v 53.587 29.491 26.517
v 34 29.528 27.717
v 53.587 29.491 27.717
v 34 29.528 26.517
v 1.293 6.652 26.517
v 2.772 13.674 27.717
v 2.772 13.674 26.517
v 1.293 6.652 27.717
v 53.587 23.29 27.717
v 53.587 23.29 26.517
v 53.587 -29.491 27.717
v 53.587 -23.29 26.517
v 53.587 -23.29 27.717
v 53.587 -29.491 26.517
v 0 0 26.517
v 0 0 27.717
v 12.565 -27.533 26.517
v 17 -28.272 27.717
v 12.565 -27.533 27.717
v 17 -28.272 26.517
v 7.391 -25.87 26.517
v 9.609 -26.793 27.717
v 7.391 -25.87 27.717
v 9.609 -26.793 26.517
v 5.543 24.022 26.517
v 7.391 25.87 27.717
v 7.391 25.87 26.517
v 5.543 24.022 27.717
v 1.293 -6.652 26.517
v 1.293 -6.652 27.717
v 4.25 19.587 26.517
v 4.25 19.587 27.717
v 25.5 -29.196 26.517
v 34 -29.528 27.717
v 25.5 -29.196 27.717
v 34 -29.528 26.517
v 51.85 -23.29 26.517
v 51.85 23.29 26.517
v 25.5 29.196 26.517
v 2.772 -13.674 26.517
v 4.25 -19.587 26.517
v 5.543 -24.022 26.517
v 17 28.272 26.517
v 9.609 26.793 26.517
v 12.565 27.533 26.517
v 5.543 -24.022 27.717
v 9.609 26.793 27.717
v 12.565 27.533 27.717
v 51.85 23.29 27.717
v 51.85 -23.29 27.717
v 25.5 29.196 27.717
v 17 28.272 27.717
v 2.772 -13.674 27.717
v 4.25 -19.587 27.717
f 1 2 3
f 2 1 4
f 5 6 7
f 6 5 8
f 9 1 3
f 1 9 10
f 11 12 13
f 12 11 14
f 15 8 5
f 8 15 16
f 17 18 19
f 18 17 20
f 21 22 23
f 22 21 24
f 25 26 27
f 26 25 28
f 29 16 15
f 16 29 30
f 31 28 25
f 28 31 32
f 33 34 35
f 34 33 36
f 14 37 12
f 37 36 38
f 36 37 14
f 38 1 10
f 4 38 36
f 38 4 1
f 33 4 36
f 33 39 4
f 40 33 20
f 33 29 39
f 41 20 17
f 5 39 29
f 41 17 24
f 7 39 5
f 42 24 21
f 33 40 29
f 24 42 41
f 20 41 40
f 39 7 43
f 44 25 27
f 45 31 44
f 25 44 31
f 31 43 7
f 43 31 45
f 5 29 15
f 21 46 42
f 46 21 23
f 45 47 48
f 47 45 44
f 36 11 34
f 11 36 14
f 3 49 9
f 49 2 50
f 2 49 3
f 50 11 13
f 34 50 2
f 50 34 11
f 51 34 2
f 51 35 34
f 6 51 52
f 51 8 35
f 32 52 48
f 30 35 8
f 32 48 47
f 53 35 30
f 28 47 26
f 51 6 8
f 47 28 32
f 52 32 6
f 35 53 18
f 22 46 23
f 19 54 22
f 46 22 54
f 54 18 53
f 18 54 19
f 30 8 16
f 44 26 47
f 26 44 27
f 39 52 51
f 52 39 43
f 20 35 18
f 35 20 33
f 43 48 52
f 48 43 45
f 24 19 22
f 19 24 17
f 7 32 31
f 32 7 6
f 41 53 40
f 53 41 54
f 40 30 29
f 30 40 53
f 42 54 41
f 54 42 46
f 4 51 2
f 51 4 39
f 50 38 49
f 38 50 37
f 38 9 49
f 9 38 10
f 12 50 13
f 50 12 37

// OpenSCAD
// Sarepta hull study, 170 mm overall. Units in the station table are full-size mm.
// See README.md for source provenance and reconstruction limitations.
length_mm = 170;
wall_mm = 1.2;
transom_mm = 2.0;
deck_mm = 1.2;
part = "hull"; // [hull, outer, inner, sections]
station_steps = 12;

scale_factor = length_mm / 4600;
// x runs from bow to stern; y is transverse; z is above the keel baseline.
// Rows: x, then [y,z] for keel, three bottom samples, tunnel crown,
// outer chine, sheer, and deck centre. Stations 1..5 follow the 1974 body plan.
// Longitudinal positions, stem closure and sheer fairing are reconstructed.
// A separate continuous planar foredeck covers the three underlying bows.
stations = [
 [0, [[0,750],[96,750],[192,750],[288,750],[384,750],[625,750],[702,750],[0,750]]],
 [460, [[0,220],[96,325],[192,433],[288,560],[384,687],[625,506],[702,735],[0,790]]],
 [920, [[0,33],[108,92],[216,169],[324,271],[432,383],[640,270],[790,750],[0,802]]],
 [1380,[[0,0],[110,35],[219,76],[329,135],[438,211],[640,136],[800,750],[0,794]]],
 [1840,[[0,0],[110,28],[219,61],[329,99],[438,142],[640,105],[800,750],[0,780]]],
 [2300,[[0,0],[110,27],[219,53],[329,80],[438,105],[650,100],[800,750],[0,770]]],
 [3067,[[0,0],[110,16.4],[219,32.7],[329,49.2],[438,65.5],[650,97.2],[800,750],[0,765]]],
 [4200,[[0,0],[110,16.4],[219,32.7],[329,49.2],[438,65.5],[650,97.2],[800,750],[0,765]]],
 [4600,[[0,0],[110,16.4],[219,32.7],[329,49.2],[438,65.5],[650,97.2],[790,750],[0,765]]]
];

function d(i,j,k) = (stations[i+1][1][j][k]-stations[i][1][j][k]) /
                         (stations[i+1][0]-stations[i][0]);
function tangent(i,j,k) =
 i==0 ? d(0,j,k) : i==len(stations)-1 ? d(i-1,j,k) :
 let(a=d(i-1,j,k), b=d(i,j,k)) a*b<=0 ? 0 :
 sign(a)*min(abs((a+b)/2),2*abs(a),2*abs(b));
function blend(i,t,j,k) = let(h=stations[i+1][0]-stations[i][0])
 (2*t*t*t-3*t*t+1)*stations[i][1][j][k] +
 (t*t*t-2*t*t+t)*h*tangent(i,j,k) +
 (-2*t*t*t+3*t*t)*stations[i+1][1][j][k] +
 (t*t*t-t*t)*h*tangent(i+1,j,k);
function half_section(i,t) = [for(j=[0:7])
 [blend(i,t,j,0)*scale_factor,blend(i,t,j,1)*scale_factor]];
function outer_ring(p) = concat(
 [for(j=[6:-1:1]) [-p[j][0],p[j][1]]],
 [for(j=[0:7]) p[j]]);
function cross2(a,b) = a[0]*b[1]-a[1]*b[0];
function normal(v) = [-v[1],v[0]]/norm(v);
// Mitered inward offset of the open bottom/side polyline in the YZ plane.
function inset(p,j,w) =
 j==0 ? p[j]+w*normal(p[1]-p[0]) :
 j==len(p)-1 ? p[j]+w*normal(p[j]-p[j-1]) :
 let(a=p[j]-p[j-1],b=p[j+1]-p[j],na=normal(a),nb=normal(b),
     den=cross2(a,b))
 abs(den)<0.000001 ? p[j]+w*na :
 p[j]+w*na+a*(cross2(w*(nb-na),b)/den);
function inner_ring(p) = let(bottom=concat(
 [for(j=[6:-1:1]) [-p[j][0],p[j][1]]],
 [for(j=[0:6]) p[j]]), q=[for(j=[0:len(bottom)-1]) inset(bottom,j,wall_mm)])
 concat(q,[[q[len(q)-1][0],60],[q[0][0],60]]);

// Convex quintic Bezier guide curves: centre stem, tunnel crown, outboard stem.
// All three have horizontal first and second derivatives at the aft endpoint.
// Full-size reconstruction coordinates, fitted approximately to the body plan.
guide_controls = [
    [[0.0, 750.0], [0.0, 498.735739], [298.958581, 241.850206], [818.67287, 0.0], [930.073765, 0.0], [1380.0, 0.0]],
    [[380.0, 750.0], [380.0, 744.834548], [1008.769422, 200.924939], [1319.015189, 65.5], [2744.460616, 65.5], [3067.0, 65.5]],
    [[170.0, 750.0], [170.0, 638.784365], [797.86315, 290.176633], [1149.908287, 97.2], [1435.052807, 97.2], [2300.0, 97.2]]
];
function bezier5(p,t) = pow(1-t,5)*p[0]+5*pow(1-t,4)*t*p[1]+
    10*pow(1-t,3)*t*t*p[2]+10*pow(1-t,2)*pow(t,3)*p[3]+
    5*(1-t)*pow(t,4)*p[4]+pow(t,5)*p[5];
function curve_parameter(p,x,lo=0,hi=1,n=0) = x<=p[0][0] ? 0 : x>=p[5][0] ? 1 :
    n==34 ? (lo+hi)/2 :
    let(t=(lo+hi)/2) bezier5(p,t)[0]<x ? curve_parameter(p,x,t,hi,n+1) :
    curve_parameter(p,x,lo,t,n+1);
function smooth5(t) = let(u=max(0,min(1,t))) u*u*u*(10-15*u+6*u*u);
function guide_point(k,r) = let(p=guide_controls[k],start=p[0][0],end=p[5][0],
    x=r<end ? start+(end-start)*r/end : r,
    z=r<end ? bezier5(p,curve_parameter(p,x))[1] : p[5][1],
    y=k==0?0 : k==1?384+54*smooth5(r/1380) : 625+25*smooth5(r/2300))
    [x,y,z];
function sheer_point(r) = [r<1380 ? 260+(1380-260)*r/1380 : r,
    r<1380 ? 702+98*smooth5(r/1380) : r<4200 ? 800 :
    800-10*smooth5((r-4200)/400),750];
function half_surface(r,k,g) = let(c=g[0],t=g[1],b=g[2],s=g[3])
    k<=16 ? let(u=k/16,v=u*(1-0.14*(1-smooth5(r/2300))*(1-u)),p=c+(t-c)*v)
        [p[0],c[1]+(t[1]-c[1])*u,p[2]] :
    k<=20 ? t+(b-t)*(k-16)/4 : b+(s-b)*(k-20)/4;
function fair_bottom(r,j,g) = let(k=abs(j-24),p=half_surface(r,k,g))
    [p[0]*scale_factor,(j<24?-p[1]:p[1])*scale_factor,p[2]*scale_factor];

rings = concat([for(i=[0:len(stations)-2]) let(steps=i==0?48:station_steps)
    for(s=[0:steps-1])
 [ (stations[i][0]+(stations[i+1][0]-stations[i][0])*s/steps)*scale_factor,
   half_section(i,s/steps)]],
 [[length_mm,[for(p=stations[len(stations)-1][1]) p*scale_factor]]]);

// The bottom surface retains its three bow edges. A separate planar sheet
// closes their upper gaps and creates the continuous deck outline.
function top_index(i,j,m,n) = (i==0 || j==0 || j==n-1) ? i*n+j :
    m*n+(i-1)*(n-2)+j-1;
module loft(inner=false) {
    rr = inner ? [for(r=rings) if(r[0]>=length_mm*0.15) [r[0],inner_ring(r[1])]] :
                 [for(r=rings) [r[0],outer_ring(r[1])]];
    m=len(rr);
    if(inner) {
        n=len(rr[0][1]);
        pp=[for(r=rr,p=r[1]) [r[0],p[0],p[1]]];
        ff=concat([[for(j=[n-1:-1:0]) j]],
            [for(i=[0:m-2],j=[0:n-1]) each
             [[i*n+j,i*n+(j+1)%n,(i+1)*n+(j+1)%n],
              [i*n+j,(i+1)*n+(j+1)%n,(i+1)*n+j]]],
            [[for(j=[0:n-1]) (m-1)*n+j]]);
        polyhedron(points=pp,faces=[for(f=ff) [for(j=[len(f)-1:-1:0]) f[j]]],convexity=12);
    } else {
        n=49;
        outer_rows=concat([for(i=[0:180]) 3067*i/180],
            [for(i=[1:36]) 3067+(4600-3067)*i/36]);
        m=len(outer_rows);
        guides=[for(r=outer_rows) [guide_point(0,r),guide_point(1,r),guide_point(2,r),sheer_point(r)]];
        bottom=[for(i=[0:m-1],j=[0:n-1]) fair_bottom(outer_rows[i],j,guides[i])];
        top=[for(i=[1:m-1],j=[1:n-2]) let(p=bottom[i*n+j])
            [p[0],p[1],750*scale_factor]];
        ff=concat(
            [for(i=[0:m-2],j=[0:n-2]) each
                [[i*n+j,i*n+j+1,(i+1)*n+j+1],
                 [i*n+j,(i+1)*n+j+1,(i+1)*n+j]]],
            [for(i=[0:m-2],j=[0:n-2]) let(
                a=top_index(i,j,m,n),b=top_index(i,j+1,m,n),
                c=top_index(i+1,j,m,n),d=top_index(i+1,j+1,m,n)) each
                [[a,c,d],[a,d,b]]],
            [concat([for(j=[0:n-1]) (m-1)*n+j],
                    [for(j=[n-2:-1:1]) top_index(m-1,j,m,n)])]);
        polyhedron(points=concat(bottom,top),
            faces=[for(f=ff) [for(j=[len(f)-1:-1:0]) f[j]]],convexity=12);
    }
}

// Continuous shallow-V plan outline; the tunnels remain below this sheet.
function deck_outline() = let(half=[
    [0,0],[35,180],[75,370],[115,530],[150,650],[200,700],
    [260,725],[340,745],[460,765],[690,790],[920,799],[1450,798]])
    concat([for(p=half) p*scale_factor],
        [for(i=[len(half)-1:-1:1]) [half[i][0]*scale_factor,-half[i][1]*scale_factor]]);
module foredeck_sheet() {
    translate([0,0,750*scale_factor-deck_mm])
        linear_extrude(height=deck_mm) polygon(deck_outline());
}
module exterior() { union() { loft(); foredeck_sheet(); } }

module hull() {
    difference() {
        exterior();
        // Leave a 6 mm side deck, a closed foredeck, and an aft well bulkhead.
        intersection() {
            loft(true);
            union() {
                intersection() {
                    translate([0,0,-deck_mm]) exterior();
                    translate([length_mm*0.15,-40,-1])
                        cube([length_mm*0.71,80,62]);
                }
                translate([length_mm*0.305,-length_mm*0.137,-1])
                    cube([length_mm*0.555,length_mm*0.274,62]);
            }
        }
        // Original-style motor well: low central transom, high aft quarters.
        // The well floor is sealed, with a full-height forward bulkhead.
        translate([length_mm*0.86+wall_mm,-length_mm*0.122,8.0*length_mm/170])
            cube([length_mm*0.14-transom_mm-wall_mm,length_mm*0.244,55]);
        translate([length_mm-transom_mm-0.01,-length_mm*0.122,400*scale_factor])
            cube([transom_mm+0.1,length_mm*0.244,55]);
    }
}

assert(length_mm>=80 && length_mm<=180,"Expected an 80..180 mm model.");
assert(wall_mm>=0.8 && wall_mm<=2,"Wall thickness outside the studied range.");
if(part=="hull") color([0.72,0.77,0.79]) hull();
else if(part=="outer") exterior();
else if(part=="inner") loft(true);
else if(part=="sections")
    for(i=[1:len(stations)-1])
        translate([stations[i][0]*scale_factor,0,0])
            rotate([90,0,90]) linear_extrude(height=0.25)
                polygon(outer_ring([for(p=stations[i][1]) p*scale_factor]));
else assert(false,"Unknown part selector.");
